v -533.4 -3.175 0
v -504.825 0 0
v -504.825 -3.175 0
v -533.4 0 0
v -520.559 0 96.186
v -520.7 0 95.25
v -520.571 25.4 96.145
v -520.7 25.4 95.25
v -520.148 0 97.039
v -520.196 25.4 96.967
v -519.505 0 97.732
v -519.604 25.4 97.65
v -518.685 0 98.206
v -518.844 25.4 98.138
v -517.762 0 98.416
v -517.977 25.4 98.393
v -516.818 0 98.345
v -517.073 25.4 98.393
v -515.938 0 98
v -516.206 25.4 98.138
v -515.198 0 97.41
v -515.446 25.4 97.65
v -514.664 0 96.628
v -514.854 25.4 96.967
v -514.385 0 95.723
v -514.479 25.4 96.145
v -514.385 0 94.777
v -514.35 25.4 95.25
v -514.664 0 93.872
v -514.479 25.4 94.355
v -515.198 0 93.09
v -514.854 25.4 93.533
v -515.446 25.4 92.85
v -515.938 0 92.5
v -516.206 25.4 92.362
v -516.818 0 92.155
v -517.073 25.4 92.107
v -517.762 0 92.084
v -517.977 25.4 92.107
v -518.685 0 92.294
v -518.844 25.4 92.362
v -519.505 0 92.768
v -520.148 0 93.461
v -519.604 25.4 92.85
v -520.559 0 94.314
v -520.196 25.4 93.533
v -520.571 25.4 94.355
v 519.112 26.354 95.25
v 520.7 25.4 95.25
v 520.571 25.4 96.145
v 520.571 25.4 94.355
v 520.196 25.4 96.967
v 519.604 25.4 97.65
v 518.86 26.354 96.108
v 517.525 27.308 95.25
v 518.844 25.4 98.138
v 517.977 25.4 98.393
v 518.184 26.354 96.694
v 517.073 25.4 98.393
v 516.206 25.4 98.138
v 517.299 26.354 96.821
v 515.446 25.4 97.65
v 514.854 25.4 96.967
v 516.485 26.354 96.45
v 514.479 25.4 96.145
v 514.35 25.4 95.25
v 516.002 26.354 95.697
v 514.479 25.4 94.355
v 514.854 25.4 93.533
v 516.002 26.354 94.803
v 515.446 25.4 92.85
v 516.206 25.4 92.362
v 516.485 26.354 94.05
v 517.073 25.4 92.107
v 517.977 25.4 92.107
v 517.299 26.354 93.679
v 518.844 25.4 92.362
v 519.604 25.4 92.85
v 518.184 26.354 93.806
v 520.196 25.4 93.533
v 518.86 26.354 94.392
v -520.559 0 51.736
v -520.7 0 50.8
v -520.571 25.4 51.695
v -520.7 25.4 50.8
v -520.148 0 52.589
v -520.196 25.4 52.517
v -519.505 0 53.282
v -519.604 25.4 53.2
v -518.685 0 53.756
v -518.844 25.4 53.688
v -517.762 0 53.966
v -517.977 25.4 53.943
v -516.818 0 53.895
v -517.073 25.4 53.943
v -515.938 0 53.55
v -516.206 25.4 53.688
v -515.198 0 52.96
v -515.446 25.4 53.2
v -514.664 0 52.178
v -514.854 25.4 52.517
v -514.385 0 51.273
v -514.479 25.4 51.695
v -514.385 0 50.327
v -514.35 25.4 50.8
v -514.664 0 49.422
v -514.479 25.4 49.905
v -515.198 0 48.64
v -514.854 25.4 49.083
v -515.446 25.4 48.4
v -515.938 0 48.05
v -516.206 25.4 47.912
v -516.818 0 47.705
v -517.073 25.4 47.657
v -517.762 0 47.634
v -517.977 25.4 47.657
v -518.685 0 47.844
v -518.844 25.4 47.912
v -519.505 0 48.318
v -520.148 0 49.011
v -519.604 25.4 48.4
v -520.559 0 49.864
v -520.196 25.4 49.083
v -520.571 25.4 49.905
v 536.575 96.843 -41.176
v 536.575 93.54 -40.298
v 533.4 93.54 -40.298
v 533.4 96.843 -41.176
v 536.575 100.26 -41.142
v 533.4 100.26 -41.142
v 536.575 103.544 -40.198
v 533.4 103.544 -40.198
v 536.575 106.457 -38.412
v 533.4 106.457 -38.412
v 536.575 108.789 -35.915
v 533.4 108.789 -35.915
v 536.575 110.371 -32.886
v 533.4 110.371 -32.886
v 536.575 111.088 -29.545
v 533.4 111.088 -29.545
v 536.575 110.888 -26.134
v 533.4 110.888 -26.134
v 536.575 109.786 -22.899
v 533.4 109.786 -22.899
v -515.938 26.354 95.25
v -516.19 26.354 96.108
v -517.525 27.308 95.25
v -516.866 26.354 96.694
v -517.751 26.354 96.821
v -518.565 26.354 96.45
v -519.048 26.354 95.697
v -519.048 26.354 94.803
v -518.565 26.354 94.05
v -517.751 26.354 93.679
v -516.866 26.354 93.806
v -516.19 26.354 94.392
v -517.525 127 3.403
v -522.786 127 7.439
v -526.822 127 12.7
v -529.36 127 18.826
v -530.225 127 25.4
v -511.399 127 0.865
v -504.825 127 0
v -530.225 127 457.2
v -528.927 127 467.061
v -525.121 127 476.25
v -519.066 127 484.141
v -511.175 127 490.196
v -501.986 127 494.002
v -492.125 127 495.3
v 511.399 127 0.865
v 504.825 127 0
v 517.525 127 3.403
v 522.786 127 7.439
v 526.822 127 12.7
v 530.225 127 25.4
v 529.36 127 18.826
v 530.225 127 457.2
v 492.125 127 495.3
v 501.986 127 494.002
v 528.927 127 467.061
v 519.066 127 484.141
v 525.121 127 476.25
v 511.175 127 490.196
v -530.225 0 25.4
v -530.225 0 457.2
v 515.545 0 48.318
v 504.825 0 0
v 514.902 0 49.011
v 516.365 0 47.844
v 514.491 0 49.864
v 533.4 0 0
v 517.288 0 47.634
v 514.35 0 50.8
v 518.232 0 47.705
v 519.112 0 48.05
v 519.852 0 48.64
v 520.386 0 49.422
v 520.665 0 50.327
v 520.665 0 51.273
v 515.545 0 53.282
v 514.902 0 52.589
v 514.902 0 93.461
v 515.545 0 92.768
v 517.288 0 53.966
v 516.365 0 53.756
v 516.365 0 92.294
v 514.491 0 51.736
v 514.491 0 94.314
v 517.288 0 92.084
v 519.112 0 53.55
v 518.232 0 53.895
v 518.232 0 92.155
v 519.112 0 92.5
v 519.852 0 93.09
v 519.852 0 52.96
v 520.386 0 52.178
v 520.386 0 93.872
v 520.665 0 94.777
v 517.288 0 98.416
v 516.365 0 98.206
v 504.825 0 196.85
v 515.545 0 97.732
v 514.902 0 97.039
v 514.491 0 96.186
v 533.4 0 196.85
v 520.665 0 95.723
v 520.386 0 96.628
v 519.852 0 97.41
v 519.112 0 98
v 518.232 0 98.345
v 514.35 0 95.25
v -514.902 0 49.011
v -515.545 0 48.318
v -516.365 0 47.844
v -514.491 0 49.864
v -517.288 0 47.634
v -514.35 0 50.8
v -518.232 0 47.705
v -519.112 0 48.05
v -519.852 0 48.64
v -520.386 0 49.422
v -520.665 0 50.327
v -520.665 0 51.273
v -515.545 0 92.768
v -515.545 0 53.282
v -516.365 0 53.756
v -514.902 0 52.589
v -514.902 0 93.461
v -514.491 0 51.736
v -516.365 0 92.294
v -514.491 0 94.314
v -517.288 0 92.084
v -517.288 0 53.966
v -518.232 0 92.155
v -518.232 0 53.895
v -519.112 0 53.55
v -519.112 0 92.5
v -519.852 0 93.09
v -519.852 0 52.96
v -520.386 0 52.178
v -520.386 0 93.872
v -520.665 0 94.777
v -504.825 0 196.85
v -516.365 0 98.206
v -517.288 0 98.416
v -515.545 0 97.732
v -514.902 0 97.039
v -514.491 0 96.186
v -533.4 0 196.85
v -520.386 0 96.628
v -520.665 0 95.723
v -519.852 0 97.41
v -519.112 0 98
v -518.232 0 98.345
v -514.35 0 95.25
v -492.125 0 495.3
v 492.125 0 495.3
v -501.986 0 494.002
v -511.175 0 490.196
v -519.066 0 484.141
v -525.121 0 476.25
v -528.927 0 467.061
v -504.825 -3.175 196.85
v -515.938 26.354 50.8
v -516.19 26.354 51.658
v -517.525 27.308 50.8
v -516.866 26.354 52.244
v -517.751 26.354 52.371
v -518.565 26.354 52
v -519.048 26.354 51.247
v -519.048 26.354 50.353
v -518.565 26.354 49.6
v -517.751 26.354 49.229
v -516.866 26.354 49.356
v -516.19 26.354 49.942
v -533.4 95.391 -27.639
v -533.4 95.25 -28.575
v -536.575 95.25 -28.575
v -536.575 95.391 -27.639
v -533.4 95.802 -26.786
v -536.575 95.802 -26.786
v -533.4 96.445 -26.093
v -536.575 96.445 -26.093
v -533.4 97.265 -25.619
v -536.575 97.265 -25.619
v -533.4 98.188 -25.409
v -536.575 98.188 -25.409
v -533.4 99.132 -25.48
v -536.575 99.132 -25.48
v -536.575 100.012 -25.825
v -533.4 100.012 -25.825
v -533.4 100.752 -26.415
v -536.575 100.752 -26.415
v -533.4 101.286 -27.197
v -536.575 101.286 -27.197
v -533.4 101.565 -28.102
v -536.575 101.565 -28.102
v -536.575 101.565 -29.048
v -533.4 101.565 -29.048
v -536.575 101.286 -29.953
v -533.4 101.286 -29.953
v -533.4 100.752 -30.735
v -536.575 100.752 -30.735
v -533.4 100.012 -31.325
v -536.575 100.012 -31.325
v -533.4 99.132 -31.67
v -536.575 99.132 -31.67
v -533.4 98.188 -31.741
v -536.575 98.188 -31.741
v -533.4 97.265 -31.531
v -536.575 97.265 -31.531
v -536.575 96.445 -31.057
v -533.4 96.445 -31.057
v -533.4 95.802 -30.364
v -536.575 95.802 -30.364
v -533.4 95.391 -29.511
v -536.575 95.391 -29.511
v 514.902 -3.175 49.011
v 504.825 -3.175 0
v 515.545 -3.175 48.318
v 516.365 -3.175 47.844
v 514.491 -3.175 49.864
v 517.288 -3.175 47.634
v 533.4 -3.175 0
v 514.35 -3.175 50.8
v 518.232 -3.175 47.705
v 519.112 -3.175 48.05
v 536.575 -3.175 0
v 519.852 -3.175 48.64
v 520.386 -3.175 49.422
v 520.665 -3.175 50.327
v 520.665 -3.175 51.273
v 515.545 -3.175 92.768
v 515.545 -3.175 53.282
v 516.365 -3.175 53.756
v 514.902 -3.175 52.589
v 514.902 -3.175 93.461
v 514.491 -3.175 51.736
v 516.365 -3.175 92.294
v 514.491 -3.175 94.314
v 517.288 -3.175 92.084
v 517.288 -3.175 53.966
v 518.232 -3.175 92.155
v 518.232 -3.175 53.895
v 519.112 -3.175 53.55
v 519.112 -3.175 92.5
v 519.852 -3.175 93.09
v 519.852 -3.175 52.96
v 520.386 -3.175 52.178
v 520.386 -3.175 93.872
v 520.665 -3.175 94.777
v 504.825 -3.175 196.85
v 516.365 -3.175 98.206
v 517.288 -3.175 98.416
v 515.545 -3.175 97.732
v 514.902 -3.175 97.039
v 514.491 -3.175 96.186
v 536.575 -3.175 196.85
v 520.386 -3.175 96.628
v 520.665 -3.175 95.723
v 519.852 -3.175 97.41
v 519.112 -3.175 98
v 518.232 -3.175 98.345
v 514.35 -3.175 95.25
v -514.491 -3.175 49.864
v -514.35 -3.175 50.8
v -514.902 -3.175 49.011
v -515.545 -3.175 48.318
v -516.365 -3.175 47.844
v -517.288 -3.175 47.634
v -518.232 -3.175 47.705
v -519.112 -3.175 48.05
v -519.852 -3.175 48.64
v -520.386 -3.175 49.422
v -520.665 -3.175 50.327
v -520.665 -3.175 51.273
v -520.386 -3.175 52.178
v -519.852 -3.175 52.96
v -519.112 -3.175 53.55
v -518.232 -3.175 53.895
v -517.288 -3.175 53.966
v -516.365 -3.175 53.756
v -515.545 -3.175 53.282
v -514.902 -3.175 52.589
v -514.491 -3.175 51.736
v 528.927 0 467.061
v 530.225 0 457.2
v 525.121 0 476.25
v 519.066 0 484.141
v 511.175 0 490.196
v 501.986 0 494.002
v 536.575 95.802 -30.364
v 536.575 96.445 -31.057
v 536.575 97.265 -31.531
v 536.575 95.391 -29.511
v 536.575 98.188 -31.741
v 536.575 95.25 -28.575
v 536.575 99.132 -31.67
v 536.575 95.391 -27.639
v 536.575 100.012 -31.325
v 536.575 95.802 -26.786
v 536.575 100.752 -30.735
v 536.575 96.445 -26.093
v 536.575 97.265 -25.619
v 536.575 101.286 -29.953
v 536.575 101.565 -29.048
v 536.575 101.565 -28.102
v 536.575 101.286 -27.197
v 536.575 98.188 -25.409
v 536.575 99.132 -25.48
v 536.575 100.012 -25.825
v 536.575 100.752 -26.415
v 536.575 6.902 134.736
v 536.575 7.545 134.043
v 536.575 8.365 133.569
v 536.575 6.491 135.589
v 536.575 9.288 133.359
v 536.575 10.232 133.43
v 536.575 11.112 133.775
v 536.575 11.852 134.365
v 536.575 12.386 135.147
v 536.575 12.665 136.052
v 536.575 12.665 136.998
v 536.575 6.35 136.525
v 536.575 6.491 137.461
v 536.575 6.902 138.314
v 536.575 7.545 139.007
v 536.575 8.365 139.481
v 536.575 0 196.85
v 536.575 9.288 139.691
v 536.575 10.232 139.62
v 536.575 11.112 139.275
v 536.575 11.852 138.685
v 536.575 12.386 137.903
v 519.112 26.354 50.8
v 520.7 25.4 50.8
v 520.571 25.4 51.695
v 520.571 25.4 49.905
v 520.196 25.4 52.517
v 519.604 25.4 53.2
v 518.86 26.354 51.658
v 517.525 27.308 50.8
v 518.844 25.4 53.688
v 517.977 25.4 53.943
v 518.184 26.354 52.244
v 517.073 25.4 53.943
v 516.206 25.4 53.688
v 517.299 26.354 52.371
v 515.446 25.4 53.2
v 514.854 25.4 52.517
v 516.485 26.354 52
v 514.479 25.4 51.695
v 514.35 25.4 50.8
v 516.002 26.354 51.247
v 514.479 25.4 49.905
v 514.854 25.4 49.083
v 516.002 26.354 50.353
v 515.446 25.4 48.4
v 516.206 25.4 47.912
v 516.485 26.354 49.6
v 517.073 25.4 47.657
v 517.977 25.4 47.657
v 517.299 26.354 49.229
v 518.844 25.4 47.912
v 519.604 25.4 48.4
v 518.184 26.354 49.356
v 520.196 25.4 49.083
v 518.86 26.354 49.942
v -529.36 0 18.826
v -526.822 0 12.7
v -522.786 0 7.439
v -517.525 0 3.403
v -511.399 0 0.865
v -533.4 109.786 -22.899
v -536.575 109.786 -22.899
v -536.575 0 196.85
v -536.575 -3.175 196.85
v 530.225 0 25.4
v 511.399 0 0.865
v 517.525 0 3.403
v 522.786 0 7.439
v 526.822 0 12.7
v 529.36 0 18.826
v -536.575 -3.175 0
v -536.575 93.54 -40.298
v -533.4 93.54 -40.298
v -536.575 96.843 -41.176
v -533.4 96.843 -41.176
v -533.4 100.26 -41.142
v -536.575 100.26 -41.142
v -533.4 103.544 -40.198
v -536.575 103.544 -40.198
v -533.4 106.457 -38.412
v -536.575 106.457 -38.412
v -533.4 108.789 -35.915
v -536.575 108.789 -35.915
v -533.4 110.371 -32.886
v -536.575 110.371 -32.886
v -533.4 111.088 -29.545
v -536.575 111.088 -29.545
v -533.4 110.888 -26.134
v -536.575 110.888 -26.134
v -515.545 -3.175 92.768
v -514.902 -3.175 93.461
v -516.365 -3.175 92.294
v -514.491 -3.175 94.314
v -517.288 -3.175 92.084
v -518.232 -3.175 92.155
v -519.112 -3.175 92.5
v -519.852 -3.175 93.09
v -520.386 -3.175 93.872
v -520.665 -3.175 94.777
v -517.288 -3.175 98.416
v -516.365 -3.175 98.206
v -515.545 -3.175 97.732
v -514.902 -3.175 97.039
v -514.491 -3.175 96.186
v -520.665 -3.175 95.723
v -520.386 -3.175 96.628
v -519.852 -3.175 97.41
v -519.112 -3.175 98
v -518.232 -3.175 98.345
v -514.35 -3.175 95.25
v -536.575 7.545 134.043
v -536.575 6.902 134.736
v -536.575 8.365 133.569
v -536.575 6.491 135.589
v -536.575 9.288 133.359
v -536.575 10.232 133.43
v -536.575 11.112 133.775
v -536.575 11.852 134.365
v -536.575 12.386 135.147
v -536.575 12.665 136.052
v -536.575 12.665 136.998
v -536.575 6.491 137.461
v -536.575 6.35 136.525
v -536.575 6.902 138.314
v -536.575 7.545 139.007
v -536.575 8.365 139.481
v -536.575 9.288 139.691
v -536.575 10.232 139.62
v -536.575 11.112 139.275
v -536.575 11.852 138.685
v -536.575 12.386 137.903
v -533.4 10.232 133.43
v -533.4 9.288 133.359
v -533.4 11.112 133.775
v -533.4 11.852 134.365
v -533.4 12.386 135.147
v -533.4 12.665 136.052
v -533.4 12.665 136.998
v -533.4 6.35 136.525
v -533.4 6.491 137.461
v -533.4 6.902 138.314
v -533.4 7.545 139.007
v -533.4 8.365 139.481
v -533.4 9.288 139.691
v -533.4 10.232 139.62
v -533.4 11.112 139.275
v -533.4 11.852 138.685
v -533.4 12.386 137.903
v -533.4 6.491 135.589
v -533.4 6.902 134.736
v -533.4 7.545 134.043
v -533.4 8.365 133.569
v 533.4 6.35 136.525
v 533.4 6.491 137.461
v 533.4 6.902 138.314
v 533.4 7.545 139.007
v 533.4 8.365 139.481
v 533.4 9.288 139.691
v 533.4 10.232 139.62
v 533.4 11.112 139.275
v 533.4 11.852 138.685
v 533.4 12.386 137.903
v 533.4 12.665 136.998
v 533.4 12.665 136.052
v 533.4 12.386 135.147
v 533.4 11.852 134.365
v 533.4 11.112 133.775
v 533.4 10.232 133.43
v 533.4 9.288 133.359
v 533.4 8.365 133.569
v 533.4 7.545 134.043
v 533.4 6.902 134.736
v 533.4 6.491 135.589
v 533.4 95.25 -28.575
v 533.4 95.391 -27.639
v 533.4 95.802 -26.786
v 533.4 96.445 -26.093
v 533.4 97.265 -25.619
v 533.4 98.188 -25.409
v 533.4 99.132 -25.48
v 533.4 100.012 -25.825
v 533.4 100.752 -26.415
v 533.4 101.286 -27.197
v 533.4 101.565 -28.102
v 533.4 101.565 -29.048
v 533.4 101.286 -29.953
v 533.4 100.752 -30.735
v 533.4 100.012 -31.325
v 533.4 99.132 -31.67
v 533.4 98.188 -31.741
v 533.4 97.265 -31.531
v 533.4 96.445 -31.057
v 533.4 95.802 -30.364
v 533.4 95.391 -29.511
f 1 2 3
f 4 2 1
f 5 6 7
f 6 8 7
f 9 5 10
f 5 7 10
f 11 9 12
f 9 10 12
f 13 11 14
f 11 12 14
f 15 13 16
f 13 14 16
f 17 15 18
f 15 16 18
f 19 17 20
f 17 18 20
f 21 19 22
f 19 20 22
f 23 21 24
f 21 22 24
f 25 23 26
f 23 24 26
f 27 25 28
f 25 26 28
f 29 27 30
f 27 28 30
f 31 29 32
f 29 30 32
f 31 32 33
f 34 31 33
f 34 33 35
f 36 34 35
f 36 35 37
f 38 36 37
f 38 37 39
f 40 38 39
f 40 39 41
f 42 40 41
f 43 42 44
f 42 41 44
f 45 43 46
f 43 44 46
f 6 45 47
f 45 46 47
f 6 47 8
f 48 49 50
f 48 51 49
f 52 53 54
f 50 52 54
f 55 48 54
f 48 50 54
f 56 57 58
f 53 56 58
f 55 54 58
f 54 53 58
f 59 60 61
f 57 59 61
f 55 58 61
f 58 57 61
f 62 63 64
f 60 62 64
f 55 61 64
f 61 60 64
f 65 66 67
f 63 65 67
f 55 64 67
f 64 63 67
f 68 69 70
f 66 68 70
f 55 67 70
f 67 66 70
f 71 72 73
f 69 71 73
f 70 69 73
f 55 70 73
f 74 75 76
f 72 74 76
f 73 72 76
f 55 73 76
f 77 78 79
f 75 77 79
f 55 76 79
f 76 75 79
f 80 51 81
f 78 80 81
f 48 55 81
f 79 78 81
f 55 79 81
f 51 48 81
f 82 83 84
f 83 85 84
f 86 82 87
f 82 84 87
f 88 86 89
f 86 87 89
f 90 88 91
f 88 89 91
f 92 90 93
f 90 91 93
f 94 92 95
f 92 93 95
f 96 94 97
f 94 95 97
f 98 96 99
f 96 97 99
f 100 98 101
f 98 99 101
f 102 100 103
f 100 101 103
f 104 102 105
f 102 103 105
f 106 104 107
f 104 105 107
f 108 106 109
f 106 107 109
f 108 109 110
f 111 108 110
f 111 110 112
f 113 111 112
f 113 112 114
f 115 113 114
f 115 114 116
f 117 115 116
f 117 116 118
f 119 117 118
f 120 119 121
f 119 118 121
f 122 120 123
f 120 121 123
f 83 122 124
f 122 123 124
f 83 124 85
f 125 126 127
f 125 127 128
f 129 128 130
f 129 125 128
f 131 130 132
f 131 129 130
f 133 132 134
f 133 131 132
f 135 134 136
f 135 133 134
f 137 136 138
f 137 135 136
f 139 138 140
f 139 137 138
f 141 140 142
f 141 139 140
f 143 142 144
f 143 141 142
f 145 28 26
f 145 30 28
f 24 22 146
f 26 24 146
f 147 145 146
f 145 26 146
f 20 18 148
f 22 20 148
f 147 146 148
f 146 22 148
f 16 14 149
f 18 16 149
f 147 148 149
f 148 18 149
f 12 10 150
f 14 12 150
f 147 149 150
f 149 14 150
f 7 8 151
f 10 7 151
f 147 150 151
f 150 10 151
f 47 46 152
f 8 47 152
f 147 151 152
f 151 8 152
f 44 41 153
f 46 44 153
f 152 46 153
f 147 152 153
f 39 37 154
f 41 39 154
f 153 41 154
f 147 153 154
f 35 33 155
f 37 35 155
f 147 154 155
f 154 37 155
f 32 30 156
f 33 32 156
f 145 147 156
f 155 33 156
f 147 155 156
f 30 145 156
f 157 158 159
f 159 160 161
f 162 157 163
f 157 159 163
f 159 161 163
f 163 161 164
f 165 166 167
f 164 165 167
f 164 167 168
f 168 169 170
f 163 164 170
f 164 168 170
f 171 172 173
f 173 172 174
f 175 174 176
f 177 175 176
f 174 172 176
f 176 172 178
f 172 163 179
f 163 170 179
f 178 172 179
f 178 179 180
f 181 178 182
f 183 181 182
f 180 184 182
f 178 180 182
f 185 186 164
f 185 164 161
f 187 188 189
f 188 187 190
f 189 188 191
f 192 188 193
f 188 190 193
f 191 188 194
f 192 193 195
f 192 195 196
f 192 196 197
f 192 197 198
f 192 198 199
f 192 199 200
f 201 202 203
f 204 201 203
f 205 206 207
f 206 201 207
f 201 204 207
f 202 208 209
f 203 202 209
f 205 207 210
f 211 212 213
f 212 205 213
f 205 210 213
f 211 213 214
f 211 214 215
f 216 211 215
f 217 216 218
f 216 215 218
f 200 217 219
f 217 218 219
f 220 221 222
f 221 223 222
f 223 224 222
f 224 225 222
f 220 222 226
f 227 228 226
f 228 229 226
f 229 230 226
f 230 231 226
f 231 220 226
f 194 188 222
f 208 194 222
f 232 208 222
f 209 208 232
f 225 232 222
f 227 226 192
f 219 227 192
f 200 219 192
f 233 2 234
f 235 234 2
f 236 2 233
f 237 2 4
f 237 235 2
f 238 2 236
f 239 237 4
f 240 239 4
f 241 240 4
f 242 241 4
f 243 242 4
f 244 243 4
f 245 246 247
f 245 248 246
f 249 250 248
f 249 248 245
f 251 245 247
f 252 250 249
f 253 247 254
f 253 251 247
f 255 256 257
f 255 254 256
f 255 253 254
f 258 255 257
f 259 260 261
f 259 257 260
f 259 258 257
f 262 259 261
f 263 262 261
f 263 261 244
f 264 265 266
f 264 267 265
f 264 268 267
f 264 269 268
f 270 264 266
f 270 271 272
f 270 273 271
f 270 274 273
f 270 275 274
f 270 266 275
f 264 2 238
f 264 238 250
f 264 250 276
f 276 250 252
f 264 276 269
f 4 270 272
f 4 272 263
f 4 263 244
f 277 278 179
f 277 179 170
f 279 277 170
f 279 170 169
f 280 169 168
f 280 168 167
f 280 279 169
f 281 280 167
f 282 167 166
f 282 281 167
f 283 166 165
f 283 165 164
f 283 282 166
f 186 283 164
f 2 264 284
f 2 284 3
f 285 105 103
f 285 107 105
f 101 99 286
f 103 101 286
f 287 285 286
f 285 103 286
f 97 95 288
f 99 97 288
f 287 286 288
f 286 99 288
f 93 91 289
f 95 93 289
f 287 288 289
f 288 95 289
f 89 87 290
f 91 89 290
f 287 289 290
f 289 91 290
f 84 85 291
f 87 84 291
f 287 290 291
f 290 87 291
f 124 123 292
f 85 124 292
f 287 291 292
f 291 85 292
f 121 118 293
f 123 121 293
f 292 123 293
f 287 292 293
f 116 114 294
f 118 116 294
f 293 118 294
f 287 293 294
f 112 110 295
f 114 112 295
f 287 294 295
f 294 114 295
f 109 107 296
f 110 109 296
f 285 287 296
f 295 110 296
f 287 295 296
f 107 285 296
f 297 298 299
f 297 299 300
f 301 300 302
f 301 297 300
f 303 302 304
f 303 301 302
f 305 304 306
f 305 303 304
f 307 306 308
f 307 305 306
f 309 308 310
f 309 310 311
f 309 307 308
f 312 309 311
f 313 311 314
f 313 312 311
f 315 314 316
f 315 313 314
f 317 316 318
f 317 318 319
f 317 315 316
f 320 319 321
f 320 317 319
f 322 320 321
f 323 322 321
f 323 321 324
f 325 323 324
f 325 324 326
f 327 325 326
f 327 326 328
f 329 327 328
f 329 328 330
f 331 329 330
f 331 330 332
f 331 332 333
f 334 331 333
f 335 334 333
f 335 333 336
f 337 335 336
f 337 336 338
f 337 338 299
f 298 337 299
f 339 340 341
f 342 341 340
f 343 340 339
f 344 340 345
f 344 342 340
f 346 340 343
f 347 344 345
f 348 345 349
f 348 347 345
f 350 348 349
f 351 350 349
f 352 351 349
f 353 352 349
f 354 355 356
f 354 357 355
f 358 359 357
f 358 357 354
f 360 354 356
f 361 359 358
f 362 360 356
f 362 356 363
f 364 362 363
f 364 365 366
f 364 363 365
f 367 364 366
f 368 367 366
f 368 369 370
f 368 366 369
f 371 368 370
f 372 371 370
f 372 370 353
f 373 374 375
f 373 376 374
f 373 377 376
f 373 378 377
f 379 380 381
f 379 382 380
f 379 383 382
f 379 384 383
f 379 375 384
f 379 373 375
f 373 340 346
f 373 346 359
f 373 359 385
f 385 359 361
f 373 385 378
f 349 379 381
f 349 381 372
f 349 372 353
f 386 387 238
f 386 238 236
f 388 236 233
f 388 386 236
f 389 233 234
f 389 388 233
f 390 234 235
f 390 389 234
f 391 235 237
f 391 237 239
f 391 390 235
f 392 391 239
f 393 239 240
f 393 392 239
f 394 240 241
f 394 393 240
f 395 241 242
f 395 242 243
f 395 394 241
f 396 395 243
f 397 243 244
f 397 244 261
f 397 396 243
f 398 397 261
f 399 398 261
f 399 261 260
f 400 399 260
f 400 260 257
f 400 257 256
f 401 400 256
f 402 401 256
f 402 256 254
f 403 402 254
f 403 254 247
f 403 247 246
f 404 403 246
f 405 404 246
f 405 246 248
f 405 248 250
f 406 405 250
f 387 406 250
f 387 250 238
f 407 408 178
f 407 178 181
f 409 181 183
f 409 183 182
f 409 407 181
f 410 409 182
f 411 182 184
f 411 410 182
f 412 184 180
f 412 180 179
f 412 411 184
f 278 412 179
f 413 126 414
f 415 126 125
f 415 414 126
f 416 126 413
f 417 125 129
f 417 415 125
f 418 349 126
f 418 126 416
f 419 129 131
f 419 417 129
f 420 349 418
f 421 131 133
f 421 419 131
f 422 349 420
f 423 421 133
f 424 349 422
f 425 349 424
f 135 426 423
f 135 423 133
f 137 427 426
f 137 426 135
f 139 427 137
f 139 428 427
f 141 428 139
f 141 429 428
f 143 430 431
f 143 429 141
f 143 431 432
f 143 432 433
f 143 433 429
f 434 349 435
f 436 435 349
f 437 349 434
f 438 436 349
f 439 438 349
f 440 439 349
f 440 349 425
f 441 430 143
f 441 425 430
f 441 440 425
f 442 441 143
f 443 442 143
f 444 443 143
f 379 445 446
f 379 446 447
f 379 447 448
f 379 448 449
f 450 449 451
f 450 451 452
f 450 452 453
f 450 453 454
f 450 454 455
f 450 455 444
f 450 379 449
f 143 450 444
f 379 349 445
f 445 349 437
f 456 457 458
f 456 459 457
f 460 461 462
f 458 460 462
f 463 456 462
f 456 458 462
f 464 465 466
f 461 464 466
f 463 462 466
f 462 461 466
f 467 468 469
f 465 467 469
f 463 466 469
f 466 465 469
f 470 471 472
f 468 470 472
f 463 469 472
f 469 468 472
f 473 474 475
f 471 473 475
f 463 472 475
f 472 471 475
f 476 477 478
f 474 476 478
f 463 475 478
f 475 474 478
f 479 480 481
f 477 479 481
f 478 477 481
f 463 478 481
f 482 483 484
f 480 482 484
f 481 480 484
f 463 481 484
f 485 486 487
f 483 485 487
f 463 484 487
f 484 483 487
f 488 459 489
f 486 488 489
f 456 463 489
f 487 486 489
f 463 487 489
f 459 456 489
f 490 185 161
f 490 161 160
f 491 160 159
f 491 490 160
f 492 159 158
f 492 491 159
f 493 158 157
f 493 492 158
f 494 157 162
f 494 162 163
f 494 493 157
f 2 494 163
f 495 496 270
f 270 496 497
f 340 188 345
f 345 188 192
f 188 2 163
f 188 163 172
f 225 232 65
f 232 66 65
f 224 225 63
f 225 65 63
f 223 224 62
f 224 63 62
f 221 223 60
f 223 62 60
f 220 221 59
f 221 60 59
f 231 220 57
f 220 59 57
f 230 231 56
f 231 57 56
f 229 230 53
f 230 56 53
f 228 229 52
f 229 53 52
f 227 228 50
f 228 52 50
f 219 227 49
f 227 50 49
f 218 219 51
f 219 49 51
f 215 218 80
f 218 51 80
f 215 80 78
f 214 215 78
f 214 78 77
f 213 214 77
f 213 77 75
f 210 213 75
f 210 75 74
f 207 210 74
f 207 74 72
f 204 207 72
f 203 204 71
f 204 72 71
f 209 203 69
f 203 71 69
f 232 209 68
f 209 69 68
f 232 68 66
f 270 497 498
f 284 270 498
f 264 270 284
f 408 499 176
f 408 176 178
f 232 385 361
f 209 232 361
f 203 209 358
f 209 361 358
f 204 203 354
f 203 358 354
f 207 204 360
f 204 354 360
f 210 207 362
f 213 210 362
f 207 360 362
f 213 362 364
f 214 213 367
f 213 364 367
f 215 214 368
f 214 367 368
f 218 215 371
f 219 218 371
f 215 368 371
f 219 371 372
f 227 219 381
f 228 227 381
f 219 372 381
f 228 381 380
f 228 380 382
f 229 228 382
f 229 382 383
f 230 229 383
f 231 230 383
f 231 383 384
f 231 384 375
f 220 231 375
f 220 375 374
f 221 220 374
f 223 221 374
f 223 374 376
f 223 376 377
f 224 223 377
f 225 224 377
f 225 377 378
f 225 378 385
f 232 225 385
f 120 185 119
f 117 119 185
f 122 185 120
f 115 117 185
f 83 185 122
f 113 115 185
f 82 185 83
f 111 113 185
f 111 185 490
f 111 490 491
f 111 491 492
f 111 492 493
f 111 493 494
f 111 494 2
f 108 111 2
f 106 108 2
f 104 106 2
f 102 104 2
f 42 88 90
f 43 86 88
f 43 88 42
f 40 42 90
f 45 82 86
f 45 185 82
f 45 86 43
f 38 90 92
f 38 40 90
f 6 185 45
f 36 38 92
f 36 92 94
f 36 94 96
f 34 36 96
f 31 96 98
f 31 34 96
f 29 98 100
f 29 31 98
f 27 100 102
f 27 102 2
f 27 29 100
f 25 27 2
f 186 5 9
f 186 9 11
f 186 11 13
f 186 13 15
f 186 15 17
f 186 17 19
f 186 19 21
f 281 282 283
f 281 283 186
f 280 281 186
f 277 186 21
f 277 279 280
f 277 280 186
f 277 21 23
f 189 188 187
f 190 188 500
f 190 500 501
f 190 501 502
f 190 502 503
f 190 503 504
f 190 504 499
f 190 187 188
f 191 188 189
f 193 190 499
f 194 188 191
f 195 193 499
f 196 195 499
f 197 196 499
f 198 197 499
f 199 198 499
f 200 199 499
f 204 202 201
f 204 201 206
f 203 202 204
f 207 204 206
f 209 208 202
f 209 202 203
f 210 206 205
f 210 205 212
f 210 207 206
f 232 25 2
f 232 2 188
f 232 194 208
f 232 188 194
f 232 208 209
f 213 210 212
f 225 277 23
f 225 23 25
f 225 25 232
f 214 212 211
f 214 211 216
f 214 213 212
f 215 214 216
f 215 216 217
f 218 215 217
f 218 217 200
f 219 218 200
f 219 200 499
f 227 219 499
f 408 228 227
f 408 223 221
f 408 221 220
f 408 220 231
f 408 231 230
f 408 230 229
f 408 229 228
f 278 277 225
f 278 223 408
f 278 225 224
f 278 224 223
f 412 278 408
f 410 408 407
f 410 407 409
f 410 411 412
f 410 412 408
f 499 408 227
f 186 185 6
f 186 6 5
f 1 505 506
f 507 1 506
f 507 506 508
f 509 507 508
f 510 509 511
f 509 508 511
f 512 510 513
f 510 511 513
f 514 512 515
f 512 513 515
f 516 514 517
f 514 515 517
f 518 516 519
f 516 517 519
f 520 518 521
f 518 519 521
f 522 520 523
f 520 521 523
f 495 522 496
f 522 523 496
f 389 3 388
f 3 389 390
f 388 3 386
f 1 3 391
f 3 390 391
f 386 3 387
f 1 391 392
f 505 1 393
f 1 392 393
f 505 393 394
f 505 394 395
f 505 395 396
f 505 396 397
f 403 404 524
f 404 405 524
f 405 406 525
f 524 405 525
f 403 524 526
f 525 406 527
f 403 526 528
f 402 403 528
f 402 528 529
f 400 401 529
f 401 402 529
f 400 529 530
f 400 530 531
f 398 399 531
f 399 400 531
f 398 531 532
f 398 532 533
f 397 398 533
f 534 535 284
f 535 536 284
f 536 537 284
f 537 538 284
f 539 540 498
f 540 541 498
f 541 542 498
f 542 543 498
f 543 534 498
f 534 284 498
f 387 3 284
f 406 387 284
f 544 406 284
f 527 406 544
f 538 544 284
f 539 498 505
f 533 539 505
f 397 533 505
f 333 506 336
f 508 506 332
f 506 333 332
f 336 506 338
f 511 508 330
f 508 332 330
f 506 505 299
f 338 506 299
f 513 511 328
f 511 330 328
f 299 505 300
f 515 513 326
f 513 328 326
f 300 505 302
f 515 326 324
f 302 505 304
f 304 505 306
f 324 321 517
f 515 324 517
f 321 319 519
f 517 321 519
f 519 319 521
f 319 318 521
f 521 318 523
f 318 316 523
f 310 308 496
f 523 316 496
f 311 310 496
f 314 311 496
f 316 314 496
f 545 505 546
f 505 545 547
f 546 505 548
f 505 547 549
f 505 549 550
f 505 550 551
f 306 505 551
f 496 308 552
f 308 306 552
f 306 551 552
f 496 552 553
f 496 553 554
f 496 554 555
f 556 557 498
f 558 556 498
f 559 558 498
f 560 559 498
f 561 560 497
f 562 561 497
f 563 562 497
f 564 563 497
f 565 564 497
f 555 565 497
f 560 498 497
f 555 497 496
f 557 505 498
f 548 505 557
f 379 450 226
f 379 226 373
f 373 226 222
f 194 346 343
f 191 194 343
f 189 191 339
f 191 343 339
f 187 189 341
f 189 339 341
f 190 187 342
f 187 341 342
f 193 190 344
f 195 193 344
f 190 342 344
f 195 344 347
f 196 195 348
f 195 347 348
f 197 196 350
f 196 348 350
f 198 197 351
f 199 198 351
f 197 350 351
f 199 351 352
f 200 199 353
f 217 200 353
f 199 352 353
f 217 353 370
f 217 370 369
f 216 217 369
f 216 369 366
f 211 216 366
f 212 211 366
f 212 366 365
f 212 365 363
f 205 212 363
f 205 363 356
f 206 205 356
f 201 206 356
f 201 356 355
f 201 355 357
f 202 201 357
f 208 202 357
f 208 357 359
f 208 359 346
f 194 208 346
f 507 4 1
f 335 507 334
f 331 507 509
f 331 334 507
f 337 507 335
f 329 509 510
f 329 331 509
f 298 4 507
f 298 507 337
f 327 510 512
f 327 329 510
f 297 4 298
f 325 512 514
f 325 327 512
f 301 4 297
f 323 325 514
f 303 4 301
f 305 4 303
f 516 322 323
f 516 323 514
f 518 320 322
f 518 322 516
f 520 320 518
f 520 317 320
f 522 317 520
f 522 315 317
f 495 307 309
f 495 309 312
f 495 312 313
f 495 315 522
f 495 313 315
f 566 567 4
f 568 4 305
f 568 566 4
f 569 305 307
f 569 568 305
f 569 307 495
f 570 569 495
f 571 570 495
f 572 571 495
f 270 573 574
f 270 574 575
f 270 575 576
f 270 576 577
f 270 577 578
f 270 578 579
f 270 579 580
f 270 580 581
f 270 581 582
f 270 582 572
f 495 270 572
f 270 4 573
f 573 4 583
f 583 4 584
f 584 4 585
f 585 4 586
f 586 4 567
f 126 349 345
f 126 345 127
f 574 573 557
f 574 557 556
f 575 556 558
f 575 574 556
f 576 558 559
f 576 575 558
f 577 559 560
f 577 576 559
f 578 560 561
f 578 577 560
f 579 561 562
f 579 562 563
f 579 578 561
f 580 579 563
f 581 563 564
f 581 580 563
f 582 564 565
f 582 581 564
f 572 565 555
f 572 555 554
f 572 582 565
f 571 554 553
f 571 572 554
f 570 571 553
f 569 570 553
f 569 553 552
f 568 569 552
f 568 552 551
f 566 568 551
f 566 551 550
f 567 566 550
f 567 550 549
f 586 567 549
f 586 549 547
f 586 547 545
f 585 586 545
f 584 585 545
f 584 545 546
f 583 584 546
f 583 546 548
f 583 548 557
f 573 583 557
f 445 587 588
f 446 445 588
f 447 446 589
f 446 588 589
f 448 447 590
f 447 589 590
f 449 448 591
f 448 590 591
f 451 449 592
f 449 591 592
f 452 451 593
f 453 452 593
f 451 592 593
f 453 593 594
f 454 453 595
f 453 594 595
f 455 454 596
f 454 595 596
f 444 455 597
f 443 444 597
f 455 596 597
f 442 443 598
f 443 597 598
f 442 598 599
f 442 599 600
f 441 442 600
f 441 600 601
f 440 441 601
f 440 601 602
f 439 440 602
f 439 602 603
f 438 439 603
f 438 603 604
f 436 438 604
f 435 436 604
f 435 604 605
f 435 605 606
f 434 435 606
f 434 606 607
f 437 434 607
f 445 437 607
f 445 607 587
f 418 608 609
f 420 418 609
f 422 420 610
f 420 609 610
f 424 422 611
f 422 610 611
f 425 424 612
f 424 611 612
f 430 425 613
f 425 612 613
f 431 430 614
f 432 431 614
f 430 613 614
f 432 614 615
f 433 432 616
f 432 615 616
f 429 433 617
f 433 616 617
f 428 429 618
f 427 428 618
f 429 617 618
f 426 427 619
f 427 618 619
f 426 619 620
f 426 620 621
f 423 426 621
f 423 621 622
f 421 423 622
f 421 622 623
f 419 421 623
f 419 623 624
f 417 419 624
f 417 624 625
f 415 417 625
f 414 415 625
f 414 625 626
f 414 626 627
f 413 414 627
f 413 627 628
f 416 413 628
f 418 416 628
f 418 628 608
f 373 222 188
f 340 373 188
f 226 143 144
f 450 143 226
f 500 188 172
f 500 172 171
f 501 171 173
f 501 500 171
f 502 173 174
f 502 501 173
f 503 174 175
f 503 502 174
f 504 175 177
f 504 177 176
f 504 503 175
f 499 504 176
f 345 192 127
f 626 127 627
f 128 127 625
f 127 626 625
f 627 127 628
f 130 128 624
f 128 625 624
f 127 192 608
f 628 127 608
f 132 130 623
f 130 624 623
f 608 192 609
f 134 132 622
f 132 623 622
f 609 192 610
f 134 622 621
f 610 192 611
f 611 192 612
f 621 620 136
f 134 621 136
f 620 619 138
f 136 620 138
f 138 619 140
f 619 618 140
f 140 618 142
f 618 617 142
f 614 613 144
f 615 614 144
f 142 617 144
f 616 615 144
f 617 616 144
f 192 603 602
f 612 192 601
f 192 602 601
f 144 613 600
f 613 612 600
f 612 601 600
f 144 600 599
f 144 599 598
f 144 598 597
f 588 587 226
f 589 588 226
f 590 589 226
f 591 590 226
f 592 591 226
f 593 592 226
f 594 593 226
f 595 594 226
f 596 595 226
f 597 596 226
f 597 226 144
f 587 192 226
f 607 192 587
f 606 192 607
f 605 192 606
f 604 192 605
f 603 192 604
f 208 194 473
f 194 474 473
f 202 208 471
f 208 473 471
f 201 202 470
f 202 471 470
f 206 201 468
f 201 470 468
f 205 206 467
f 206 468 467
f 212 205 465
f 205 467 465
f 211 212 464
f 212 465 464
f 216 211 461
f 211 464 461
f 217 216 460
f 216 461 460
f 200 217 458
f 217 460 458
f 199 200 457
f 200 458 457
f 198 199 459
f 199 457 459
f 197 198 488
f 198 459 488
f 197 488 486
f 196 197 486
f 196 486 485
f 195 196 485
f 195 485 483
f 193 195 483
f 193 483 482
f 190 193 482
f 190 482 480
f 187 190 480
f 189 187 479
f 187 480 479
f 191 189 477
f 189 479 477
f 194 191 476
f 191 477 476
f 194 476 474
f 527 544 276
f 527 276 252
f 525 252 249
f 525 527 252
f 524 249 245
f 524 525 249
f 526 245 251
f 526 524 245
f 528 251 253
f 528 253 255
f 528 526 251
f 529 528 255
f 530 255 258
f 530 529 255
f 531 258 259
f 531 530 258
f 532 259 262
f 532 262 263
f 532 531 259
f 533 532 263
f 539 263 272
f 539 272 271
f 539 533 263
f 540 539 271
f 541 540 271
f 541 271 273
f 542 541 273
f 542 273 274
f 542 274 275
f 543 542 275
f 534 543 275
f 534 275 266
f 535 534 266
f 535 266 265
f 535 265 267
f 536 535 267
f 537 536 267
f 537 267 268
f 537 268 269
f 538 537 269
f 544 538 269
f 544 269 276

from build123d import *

# Parameters (mm, degrees)
F0_W     = 298.45
F0_H     = 495.3
F0_W_2   = 222.25
F1_DEPTH = 127
F2_D     = 6.35
F2_DEPTH = 25.4
F2_TIP   = 1.9077324654
F4_DEPTH = 3.175
F5_D     = 6.35
F6_W     = 3.175
F6_H     = 196.85
F7_DEPTH = 3.175
F8_D     = 6.35


with BuildPart() as f1:
    # F0 (on Front) → F1 (new body)
    with BuildSketch(Plane.XZ):
        with BuildLine():
            Line((415.925, 0), (504.825, 0))
            ThreePointArc((504.825, 0), (522.7855122421, 7.4394877579), (530.225, 25.4))
            Line((530.225, 25.4), (530.225, 457.2))
            ThreePointArc((530.225, 457.2), (519.0657683632, 484.1407683632), (492.125, 495.3))
            Line((492.125, 495.3), (415.925, 495.3))
            Line((415.925, 495.3), (415.925, 0))
        make_face()
        with Locations((266.7, 247.65)):
            Rectangle(F0_W, F0_H)
        with Locations((6.35, 247.65)):
            Rectangle(F0_W_2, F0_H)
        with Locations((-254, 247.65)):
            Rectangle(F0_W, F0_H)
        with BuildLine():
            Line((-504.825, 0), (-403.225, 0))
            Line((-403.225, 0), (-403.225, 495.3))
            Line((-403.225, 495.3), (-492.125, 495.3))
            ThreePointArc((-492.125, 495.3), (-519.0657683632, 484.1407683632), (-530.225, 457.2))
            Line((-530.225, 457.2), (-530.225, 25.4))
            ThreePointArc((-530.225, 25.4), (-522.7855122421, 7.4394877579), (-504.825, 0))
        make_face()
    extrude(amount=-F1_DEPTH)

    # F2
    with Locations(Plane.XZ):
        with Locations((-517.525, 95.25), (-517.525, 50.8), (517.525, 95.25), (517.525, 50.8)):
            Hole(F2_D / 2, depth=F2_DEPTH)
            with Locations((0, 0, -(F2_DEPTH + F2_TIP / 2))):  # 118° drill point
                Cone(0, F2_D / 2, F2_TIP, mode=Mode.SUBTRACT)


with BuildPart() as f4:
    # F3 (on face) → F4 (new body)
    with BuildSketch(Plane.XZ):
        with BuildLine():
            Line((530.225, 196.85), (504.825, 196.85))
            Line((504.825, 196.85), (504.825, 0))
            ThreePointArc((504.825, 0), (522.7855122421, 7.4394877579), (530.225, 25.4))
            Line((530.225, 25.4), (530.225, 196.85))
        make_face()
        with BuildLine():
            Line((536.575, 196.85), (530.225, 196.85))
            Line((530.225, 196.85), (530.225, 25.4))
            ThreePointArc((530.225, 25.4), (522.7855122421, 7.4394877579), (504.825, 0))
            Line((504.825, 0), (536.575, 0))
            Line((536.575, 0), (536.575, 196.85))
        make_face()
    extrude(amount=F4_DEPTH)

    # F5 (through all)
    with Locations(Plane(origin=(0, 0, 0), x_dir=(1, 0, 0), z_dir=(0, 1, 0))):
        with Locations((517.525, -95.25), (517.525, -50.8)):
            Hole(F5_D / 2)

    # F6 (on face) → F7 (join)
    with BuildSketch(Plane.YZ.offset(536.575)):
        with BuildLine():
            Line((-3.175, 0), (93.5403846154, -40.2980769231))
            ThreePointArc((93.5403846154, -40.2980769231), (107.7076520014, -37.2423162986), (109.7860542815, -22.8990467222))
            Line((109.7860542815, -22.8990467222), (0, 196.85))
            Line((0, 196.85), (0, 0))
            Line((0, 0), (-3.175, 0))
        make_face()
        with Locations((-1.5875, 98.425)):
            Rectangle(F6_W, F6_H)
    extrude(amount=-F7_DEPTH)

    # F8 (through all)
    with Locations(Plane.YZ.offset(536.575)):
        with Locations((98.425, -28.575), (9.525, 136.525)):
            Hole(F8_D / 2)


with BuildPart() as f9_1:
    # F9: instance of F4
    add(f4.part.mirror(Plane.YZ))


solid = Compound([f1.part, f4.part, f9_1.part])
